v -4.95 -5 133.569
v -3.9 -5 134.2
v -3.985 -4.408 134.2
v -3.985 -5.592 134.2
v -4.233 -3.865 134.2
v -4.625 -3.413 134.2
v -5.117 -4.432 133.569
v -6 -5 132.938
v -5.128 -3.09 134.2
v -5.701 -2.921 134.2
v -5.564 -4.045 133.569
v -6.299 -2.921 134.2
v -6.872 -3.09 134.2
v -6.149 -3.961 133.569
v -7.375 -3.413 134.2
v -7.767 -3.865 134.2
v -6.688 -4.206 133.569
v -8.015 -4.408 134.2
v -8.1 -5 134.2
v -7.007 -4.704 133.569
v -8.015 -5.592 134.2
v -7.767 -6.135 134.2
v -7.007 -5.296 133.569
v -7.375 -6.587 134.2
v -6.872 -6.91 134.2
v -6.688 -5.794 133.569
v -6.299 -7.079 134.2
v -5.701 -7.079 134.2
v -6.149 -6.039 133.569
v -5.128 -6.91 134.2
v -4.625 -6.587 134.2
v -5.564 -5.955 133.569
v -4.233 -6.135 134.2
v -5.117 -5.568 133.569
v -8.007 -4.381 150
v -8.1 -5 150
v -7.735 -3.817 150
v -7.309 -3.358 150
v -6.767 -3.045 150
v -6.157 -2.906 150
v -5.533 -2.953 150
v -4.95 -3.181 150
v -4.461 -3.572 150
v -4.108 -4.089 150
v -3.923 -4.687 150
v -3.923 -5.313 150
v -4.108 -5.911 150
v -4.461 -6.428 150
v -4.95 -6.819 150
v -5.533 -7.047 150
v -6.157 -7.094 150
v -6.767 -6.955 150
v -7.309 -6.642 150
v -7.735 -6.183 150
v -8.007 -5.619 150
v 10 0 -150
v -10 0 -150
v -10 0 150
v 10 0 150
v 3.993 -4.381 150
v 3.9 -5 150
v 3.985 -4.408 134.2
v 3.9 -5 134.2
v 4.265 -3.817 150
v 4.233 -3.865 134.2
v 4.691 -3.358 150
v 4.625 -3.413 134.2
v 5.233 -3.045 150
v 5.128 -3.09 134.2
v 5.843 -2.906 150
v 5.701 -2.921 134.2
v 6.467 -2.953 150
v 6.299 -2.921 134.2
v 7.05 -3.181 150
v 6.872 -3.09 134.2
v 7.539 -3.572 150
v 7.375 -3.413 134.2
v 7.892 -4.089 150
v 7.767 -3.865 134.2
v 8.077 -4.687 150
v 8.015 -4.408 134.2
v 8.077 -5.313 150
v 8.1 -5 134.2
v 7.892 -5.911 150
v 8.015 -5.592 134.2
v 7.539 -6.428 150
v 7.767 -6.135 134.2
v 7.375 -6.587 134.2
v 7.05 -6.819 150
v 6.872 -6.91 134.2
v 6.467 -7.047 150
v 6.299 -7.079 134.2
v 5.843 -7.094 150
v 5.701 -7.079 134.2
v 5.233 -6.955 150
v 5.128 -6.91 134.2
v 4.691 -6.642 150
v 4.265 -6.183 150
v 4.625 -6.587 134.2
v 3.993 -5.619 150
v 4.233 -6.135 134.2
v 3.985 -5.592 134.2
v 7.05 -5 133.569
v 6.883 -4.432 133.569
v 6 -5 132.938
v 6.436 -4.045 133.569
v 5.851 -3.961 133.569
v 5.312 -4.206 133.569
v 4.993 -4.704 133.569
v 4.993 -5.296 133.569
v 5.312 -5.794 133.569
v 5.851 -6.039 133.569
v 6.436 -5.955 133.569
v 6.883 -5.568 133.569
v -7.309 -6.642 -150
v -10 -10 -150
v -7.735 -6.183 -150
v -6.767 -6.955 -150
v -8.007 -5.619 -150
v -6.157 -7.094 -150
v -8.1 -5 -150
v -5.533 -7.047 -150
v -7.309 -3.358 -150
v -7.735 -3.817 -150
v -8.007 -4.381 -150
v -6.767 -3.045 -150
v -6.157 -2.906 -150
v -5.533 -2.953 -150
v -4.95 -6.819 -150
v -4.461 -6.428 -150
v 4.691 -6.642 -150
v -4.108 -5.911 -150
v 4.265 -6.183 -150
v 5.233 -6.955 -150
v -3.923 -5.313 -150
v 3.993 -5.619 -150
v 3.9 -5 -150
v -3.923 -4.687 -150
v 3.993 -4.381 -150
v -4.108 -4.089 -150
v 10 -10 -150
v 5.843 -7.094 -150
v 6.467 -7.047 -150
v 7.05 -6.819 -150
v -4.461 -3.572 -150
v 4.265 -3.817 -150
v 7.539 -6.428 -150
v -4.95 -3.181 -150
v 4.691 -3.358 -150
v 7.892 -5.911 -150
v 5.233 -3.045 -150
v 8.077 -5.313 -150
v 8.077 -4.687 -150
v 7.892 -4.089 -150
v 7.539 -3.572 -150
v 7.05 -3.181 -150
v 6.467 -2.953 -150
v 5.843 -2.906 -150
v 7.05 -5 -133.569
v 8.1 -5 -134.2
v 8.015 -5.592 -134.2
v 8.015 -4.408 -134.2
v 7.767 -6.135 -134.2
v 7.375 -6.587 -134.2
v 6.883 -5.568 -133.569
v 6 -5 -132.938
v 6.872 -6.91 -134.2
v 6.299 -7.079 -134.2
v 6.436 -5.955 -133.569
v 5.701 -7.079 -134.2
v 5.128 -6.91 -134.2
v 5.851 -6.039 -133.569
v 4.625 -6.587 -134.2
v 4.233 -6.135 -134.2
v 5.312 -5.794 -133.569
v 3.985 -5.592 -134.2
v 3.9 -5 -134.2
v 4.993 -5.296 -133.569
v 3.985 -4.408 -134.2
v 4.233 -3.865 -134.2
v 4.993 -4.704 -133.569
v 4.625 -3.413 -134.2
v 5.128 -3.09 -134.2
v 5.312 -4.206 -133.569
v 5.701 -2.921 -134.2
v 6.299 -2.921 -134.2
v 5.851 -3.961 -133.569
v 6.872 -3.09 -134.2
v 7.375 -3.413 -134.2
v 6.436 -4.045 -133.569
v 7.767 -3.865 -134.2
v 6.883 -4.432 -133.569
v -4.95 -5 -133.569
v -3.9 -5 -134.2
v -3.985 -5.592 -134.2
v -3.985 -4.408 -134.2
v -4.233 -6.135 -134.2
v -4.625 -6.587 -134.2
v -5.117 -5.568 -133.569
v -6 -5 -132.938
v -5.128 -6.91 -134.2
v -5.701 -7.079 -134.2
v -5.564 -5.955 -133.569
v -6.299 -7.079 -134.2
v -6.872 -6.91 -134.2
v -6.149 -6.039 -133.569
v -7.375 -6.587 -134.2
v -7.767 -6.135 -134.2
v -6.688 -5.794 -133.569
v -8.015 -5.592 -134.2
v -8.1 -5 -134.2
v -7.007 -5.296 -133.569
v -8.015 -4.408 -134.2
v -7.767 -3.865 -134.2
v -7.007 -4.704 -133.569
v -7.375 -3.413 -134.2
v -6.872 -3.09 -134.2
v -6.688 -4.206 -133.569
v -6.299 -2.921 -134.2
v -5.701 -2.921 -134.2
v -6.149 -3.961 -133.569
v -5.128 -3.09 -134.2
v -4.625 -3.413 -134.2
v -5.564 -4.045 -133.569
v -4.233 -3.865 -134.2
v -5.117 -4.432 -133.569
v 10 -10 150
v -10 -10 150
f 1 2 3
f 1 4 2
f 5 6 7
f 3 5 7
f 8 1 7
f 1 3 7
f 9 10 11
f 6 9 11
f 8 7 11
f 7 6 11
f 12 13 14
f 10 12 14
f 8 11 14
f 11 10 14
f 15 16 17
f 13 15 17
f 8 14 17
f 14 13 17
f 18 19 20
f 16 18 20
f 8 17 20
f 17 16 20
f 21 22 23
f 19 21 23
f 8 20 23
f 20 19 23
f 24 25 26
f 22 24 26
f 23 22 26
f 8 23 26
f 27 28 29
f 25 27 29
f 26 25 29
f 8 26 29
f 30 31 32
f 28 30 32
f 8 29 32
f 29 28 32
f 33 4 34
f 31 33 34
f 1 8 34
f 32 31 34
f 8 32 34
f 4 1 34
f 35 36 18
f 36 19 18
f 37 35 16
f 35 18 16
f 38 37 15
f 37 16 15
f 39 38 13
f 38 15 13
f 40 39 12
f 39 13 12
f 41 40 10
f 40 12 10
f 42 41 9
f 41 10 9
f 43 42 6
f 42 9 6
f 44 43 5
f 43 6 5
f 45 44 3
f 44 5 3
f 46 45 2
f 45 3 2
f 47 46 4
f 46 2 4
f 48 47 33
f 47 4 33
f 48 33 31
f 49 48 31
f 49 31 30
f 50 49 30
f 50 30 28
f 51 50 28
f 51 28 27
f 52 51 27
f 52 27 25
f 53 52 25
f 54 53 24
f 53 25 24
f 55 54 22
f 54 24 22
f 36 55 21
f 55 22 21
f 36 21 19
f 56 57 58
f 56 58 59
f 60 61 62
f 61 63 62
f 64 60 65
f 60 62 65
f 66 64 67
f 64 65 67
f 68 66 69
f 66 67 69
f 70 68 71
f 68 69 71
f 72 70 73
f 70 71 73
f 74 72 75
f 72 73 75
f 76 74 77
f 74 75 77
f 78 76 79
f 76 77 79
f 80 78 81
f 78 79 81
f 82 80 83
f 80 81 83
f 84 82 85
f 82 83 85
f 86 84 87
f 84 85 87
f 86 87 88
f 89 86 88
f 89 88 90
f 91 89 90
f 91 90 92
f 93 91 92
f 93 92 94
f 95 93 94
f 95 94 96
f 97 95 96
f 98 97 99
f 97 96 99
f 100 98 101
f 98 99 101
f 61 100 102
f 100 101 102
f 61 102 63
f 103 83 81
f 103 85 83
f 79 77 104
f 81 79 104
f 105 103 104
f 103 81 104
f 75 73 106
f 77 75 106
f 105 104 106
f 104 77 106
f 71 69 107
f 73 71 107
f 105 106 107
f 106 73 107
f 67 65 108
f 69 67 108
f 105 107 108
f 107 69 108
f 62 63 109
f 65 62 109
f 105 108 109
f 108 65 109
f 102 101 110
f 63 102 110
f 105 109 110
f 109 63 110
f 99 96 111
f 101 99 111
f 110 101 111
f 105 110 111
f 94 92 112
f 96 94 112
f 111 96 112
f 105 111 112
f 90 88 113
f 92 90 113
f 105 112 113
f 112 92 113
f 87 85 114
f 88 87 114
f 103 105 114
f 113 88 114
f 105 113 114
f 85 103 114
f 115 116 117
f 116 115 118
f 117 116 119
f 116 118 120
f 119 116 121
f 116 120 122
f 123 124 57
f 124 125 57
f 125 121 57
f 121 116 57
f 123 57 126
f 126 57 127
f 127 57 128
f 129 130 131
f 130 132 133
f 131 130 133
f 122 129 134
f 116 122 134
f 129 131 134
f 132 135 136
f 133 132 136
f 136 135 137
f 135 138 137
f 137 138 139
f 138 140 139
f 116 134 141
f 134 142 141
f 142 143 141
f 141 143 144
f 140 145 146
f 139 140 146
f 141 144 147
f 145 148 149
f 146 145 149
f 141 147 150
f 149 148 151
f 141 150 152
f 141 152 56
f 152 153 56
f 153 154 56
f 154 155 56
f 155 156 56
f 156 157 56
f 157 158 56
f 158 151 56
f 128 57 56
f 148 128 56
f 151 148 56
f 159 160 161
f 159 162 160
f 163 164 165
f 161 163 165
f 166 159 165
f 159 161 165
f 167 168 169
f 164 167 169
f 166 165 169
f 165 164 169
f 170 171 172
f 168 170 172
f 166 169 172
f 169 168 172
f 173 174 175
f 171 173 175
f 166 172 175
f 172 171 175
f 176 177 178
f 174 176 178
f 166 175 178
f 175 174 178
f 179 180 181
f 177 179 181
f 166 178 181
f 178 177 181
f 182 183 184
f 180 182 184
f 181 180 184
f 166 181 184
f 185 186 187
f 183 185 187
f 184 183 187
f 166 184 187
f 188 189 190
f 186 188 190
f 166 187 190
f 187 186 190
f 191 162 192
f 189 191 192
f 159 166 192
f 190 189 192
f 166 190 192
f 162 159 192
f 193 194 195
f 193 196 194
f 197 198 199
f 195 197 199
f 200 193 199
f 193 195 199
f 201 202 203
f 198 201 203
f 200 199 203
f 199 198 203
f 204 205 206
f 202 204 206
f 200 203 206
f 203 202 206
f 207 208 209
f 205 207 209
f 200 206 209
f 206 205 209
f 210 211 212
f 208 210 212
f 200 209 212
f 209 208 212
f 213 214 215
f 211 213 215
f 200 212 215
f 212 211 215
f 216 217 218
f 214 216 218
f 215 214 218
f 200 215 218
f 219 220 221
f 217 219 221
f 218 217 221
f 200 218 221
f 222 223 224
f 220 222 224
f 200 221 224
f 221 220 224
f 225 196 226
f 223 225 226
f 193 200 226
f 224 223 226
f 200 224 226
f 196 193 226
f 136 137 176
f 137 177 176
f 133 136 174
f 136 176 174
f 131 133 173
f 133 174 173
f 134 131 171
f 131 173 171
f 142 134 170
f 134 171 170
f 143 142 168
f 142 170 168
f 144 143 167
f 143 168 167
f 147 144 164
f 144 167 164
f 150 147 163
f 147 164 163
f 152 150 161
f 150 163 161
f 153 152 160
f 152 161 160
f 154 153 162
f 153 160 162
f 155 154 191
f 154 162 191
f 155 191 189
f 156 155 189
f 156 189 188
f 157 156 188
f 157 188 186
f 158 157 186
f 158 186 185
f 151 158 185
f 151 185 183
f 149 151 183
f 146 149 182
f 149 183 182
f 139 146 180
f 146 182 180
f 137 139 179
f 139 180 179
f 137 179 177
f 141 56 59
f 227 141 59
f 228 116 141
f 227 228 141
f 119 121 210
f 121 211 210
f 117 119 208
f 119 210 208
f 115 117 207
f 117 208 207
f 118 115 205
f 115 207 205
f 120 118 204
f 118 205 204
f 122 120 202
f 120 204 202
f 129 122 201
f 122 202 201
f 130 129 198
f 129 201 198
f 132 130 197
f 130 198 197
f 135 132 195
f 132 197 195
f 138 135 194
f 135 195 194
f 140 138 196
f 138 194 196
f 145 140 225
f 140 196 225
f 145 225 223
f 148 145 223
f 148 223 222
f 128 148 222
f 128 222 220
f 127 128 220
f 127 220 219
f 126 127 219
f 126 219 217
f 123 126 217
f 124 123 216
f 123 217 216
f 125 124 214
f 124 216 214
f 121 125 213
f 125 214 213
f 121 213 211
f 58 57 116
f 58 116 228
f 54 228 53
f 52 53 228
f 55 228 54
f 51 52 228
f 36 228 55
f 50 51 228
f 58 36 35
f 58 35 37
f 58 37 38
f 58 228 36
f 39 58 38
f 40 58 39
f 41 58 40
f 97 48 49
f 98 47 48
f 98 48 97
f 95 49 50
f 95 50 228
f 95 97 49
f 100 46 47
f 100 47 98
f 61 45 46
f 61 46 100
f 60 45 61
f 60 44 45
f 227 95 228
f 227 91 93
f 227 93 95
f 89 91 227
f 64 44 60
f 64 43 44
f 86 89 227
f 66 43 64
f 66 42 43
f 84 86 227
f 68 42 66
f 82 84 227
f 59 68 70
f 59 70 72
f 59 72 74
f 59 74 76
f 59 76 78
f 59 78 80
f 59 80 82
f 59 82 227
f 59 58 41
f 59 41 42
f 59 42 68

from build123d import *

# Parameters (mm, degrees)
F0_W     = 20
F0_H     = 300
F1_DEPTH = 10
F3_D     = 4.2
F3_DEPTH = 15.8
F3_TIP   = 1.2618073
F5_D     = 4.2
F5_DEPTH = 15.8
F5_TIP   = 1.2618073


with BuildPart() as f1:
    # F0 (on Front) → F1 (new body)
    with BuildSketch(Plane.XZ):
        Rectangle(F0_W, F0_H)
    extrude(amount=F1_DEPTH)

    # F3
    with Locations(Plane(origin=(0, 0, -150), x_dir=(1, 0, 0), z_dir=(0, 0, -1))):
        with Locations((-6, 5), (6, 5)):
            Hole(F3_D / 2, depth=F3_DEPTH)
            with Locations((0, 0, -(F3_DEPTH + F3_TIP / 2))):  # 118° drill point
                Cone(0, F3_D / 2, F3_TIP, mode=Mode.SUBTRACT)

    # F5
    with Locations(Plane.XY.offset(150)):
        with Locations((6, -5), (-6, -5)):
            Hole(F5_D / 2, depth=F5_DEPTH)
            with Locations((0, 0, -(F5_DEPTH + F5_TIP / 2))):  # 118° drill point
                Cone(0, F5_D / 2, F5_TIP, mode=Mode.SUBTRACT)


solid = f1.part
